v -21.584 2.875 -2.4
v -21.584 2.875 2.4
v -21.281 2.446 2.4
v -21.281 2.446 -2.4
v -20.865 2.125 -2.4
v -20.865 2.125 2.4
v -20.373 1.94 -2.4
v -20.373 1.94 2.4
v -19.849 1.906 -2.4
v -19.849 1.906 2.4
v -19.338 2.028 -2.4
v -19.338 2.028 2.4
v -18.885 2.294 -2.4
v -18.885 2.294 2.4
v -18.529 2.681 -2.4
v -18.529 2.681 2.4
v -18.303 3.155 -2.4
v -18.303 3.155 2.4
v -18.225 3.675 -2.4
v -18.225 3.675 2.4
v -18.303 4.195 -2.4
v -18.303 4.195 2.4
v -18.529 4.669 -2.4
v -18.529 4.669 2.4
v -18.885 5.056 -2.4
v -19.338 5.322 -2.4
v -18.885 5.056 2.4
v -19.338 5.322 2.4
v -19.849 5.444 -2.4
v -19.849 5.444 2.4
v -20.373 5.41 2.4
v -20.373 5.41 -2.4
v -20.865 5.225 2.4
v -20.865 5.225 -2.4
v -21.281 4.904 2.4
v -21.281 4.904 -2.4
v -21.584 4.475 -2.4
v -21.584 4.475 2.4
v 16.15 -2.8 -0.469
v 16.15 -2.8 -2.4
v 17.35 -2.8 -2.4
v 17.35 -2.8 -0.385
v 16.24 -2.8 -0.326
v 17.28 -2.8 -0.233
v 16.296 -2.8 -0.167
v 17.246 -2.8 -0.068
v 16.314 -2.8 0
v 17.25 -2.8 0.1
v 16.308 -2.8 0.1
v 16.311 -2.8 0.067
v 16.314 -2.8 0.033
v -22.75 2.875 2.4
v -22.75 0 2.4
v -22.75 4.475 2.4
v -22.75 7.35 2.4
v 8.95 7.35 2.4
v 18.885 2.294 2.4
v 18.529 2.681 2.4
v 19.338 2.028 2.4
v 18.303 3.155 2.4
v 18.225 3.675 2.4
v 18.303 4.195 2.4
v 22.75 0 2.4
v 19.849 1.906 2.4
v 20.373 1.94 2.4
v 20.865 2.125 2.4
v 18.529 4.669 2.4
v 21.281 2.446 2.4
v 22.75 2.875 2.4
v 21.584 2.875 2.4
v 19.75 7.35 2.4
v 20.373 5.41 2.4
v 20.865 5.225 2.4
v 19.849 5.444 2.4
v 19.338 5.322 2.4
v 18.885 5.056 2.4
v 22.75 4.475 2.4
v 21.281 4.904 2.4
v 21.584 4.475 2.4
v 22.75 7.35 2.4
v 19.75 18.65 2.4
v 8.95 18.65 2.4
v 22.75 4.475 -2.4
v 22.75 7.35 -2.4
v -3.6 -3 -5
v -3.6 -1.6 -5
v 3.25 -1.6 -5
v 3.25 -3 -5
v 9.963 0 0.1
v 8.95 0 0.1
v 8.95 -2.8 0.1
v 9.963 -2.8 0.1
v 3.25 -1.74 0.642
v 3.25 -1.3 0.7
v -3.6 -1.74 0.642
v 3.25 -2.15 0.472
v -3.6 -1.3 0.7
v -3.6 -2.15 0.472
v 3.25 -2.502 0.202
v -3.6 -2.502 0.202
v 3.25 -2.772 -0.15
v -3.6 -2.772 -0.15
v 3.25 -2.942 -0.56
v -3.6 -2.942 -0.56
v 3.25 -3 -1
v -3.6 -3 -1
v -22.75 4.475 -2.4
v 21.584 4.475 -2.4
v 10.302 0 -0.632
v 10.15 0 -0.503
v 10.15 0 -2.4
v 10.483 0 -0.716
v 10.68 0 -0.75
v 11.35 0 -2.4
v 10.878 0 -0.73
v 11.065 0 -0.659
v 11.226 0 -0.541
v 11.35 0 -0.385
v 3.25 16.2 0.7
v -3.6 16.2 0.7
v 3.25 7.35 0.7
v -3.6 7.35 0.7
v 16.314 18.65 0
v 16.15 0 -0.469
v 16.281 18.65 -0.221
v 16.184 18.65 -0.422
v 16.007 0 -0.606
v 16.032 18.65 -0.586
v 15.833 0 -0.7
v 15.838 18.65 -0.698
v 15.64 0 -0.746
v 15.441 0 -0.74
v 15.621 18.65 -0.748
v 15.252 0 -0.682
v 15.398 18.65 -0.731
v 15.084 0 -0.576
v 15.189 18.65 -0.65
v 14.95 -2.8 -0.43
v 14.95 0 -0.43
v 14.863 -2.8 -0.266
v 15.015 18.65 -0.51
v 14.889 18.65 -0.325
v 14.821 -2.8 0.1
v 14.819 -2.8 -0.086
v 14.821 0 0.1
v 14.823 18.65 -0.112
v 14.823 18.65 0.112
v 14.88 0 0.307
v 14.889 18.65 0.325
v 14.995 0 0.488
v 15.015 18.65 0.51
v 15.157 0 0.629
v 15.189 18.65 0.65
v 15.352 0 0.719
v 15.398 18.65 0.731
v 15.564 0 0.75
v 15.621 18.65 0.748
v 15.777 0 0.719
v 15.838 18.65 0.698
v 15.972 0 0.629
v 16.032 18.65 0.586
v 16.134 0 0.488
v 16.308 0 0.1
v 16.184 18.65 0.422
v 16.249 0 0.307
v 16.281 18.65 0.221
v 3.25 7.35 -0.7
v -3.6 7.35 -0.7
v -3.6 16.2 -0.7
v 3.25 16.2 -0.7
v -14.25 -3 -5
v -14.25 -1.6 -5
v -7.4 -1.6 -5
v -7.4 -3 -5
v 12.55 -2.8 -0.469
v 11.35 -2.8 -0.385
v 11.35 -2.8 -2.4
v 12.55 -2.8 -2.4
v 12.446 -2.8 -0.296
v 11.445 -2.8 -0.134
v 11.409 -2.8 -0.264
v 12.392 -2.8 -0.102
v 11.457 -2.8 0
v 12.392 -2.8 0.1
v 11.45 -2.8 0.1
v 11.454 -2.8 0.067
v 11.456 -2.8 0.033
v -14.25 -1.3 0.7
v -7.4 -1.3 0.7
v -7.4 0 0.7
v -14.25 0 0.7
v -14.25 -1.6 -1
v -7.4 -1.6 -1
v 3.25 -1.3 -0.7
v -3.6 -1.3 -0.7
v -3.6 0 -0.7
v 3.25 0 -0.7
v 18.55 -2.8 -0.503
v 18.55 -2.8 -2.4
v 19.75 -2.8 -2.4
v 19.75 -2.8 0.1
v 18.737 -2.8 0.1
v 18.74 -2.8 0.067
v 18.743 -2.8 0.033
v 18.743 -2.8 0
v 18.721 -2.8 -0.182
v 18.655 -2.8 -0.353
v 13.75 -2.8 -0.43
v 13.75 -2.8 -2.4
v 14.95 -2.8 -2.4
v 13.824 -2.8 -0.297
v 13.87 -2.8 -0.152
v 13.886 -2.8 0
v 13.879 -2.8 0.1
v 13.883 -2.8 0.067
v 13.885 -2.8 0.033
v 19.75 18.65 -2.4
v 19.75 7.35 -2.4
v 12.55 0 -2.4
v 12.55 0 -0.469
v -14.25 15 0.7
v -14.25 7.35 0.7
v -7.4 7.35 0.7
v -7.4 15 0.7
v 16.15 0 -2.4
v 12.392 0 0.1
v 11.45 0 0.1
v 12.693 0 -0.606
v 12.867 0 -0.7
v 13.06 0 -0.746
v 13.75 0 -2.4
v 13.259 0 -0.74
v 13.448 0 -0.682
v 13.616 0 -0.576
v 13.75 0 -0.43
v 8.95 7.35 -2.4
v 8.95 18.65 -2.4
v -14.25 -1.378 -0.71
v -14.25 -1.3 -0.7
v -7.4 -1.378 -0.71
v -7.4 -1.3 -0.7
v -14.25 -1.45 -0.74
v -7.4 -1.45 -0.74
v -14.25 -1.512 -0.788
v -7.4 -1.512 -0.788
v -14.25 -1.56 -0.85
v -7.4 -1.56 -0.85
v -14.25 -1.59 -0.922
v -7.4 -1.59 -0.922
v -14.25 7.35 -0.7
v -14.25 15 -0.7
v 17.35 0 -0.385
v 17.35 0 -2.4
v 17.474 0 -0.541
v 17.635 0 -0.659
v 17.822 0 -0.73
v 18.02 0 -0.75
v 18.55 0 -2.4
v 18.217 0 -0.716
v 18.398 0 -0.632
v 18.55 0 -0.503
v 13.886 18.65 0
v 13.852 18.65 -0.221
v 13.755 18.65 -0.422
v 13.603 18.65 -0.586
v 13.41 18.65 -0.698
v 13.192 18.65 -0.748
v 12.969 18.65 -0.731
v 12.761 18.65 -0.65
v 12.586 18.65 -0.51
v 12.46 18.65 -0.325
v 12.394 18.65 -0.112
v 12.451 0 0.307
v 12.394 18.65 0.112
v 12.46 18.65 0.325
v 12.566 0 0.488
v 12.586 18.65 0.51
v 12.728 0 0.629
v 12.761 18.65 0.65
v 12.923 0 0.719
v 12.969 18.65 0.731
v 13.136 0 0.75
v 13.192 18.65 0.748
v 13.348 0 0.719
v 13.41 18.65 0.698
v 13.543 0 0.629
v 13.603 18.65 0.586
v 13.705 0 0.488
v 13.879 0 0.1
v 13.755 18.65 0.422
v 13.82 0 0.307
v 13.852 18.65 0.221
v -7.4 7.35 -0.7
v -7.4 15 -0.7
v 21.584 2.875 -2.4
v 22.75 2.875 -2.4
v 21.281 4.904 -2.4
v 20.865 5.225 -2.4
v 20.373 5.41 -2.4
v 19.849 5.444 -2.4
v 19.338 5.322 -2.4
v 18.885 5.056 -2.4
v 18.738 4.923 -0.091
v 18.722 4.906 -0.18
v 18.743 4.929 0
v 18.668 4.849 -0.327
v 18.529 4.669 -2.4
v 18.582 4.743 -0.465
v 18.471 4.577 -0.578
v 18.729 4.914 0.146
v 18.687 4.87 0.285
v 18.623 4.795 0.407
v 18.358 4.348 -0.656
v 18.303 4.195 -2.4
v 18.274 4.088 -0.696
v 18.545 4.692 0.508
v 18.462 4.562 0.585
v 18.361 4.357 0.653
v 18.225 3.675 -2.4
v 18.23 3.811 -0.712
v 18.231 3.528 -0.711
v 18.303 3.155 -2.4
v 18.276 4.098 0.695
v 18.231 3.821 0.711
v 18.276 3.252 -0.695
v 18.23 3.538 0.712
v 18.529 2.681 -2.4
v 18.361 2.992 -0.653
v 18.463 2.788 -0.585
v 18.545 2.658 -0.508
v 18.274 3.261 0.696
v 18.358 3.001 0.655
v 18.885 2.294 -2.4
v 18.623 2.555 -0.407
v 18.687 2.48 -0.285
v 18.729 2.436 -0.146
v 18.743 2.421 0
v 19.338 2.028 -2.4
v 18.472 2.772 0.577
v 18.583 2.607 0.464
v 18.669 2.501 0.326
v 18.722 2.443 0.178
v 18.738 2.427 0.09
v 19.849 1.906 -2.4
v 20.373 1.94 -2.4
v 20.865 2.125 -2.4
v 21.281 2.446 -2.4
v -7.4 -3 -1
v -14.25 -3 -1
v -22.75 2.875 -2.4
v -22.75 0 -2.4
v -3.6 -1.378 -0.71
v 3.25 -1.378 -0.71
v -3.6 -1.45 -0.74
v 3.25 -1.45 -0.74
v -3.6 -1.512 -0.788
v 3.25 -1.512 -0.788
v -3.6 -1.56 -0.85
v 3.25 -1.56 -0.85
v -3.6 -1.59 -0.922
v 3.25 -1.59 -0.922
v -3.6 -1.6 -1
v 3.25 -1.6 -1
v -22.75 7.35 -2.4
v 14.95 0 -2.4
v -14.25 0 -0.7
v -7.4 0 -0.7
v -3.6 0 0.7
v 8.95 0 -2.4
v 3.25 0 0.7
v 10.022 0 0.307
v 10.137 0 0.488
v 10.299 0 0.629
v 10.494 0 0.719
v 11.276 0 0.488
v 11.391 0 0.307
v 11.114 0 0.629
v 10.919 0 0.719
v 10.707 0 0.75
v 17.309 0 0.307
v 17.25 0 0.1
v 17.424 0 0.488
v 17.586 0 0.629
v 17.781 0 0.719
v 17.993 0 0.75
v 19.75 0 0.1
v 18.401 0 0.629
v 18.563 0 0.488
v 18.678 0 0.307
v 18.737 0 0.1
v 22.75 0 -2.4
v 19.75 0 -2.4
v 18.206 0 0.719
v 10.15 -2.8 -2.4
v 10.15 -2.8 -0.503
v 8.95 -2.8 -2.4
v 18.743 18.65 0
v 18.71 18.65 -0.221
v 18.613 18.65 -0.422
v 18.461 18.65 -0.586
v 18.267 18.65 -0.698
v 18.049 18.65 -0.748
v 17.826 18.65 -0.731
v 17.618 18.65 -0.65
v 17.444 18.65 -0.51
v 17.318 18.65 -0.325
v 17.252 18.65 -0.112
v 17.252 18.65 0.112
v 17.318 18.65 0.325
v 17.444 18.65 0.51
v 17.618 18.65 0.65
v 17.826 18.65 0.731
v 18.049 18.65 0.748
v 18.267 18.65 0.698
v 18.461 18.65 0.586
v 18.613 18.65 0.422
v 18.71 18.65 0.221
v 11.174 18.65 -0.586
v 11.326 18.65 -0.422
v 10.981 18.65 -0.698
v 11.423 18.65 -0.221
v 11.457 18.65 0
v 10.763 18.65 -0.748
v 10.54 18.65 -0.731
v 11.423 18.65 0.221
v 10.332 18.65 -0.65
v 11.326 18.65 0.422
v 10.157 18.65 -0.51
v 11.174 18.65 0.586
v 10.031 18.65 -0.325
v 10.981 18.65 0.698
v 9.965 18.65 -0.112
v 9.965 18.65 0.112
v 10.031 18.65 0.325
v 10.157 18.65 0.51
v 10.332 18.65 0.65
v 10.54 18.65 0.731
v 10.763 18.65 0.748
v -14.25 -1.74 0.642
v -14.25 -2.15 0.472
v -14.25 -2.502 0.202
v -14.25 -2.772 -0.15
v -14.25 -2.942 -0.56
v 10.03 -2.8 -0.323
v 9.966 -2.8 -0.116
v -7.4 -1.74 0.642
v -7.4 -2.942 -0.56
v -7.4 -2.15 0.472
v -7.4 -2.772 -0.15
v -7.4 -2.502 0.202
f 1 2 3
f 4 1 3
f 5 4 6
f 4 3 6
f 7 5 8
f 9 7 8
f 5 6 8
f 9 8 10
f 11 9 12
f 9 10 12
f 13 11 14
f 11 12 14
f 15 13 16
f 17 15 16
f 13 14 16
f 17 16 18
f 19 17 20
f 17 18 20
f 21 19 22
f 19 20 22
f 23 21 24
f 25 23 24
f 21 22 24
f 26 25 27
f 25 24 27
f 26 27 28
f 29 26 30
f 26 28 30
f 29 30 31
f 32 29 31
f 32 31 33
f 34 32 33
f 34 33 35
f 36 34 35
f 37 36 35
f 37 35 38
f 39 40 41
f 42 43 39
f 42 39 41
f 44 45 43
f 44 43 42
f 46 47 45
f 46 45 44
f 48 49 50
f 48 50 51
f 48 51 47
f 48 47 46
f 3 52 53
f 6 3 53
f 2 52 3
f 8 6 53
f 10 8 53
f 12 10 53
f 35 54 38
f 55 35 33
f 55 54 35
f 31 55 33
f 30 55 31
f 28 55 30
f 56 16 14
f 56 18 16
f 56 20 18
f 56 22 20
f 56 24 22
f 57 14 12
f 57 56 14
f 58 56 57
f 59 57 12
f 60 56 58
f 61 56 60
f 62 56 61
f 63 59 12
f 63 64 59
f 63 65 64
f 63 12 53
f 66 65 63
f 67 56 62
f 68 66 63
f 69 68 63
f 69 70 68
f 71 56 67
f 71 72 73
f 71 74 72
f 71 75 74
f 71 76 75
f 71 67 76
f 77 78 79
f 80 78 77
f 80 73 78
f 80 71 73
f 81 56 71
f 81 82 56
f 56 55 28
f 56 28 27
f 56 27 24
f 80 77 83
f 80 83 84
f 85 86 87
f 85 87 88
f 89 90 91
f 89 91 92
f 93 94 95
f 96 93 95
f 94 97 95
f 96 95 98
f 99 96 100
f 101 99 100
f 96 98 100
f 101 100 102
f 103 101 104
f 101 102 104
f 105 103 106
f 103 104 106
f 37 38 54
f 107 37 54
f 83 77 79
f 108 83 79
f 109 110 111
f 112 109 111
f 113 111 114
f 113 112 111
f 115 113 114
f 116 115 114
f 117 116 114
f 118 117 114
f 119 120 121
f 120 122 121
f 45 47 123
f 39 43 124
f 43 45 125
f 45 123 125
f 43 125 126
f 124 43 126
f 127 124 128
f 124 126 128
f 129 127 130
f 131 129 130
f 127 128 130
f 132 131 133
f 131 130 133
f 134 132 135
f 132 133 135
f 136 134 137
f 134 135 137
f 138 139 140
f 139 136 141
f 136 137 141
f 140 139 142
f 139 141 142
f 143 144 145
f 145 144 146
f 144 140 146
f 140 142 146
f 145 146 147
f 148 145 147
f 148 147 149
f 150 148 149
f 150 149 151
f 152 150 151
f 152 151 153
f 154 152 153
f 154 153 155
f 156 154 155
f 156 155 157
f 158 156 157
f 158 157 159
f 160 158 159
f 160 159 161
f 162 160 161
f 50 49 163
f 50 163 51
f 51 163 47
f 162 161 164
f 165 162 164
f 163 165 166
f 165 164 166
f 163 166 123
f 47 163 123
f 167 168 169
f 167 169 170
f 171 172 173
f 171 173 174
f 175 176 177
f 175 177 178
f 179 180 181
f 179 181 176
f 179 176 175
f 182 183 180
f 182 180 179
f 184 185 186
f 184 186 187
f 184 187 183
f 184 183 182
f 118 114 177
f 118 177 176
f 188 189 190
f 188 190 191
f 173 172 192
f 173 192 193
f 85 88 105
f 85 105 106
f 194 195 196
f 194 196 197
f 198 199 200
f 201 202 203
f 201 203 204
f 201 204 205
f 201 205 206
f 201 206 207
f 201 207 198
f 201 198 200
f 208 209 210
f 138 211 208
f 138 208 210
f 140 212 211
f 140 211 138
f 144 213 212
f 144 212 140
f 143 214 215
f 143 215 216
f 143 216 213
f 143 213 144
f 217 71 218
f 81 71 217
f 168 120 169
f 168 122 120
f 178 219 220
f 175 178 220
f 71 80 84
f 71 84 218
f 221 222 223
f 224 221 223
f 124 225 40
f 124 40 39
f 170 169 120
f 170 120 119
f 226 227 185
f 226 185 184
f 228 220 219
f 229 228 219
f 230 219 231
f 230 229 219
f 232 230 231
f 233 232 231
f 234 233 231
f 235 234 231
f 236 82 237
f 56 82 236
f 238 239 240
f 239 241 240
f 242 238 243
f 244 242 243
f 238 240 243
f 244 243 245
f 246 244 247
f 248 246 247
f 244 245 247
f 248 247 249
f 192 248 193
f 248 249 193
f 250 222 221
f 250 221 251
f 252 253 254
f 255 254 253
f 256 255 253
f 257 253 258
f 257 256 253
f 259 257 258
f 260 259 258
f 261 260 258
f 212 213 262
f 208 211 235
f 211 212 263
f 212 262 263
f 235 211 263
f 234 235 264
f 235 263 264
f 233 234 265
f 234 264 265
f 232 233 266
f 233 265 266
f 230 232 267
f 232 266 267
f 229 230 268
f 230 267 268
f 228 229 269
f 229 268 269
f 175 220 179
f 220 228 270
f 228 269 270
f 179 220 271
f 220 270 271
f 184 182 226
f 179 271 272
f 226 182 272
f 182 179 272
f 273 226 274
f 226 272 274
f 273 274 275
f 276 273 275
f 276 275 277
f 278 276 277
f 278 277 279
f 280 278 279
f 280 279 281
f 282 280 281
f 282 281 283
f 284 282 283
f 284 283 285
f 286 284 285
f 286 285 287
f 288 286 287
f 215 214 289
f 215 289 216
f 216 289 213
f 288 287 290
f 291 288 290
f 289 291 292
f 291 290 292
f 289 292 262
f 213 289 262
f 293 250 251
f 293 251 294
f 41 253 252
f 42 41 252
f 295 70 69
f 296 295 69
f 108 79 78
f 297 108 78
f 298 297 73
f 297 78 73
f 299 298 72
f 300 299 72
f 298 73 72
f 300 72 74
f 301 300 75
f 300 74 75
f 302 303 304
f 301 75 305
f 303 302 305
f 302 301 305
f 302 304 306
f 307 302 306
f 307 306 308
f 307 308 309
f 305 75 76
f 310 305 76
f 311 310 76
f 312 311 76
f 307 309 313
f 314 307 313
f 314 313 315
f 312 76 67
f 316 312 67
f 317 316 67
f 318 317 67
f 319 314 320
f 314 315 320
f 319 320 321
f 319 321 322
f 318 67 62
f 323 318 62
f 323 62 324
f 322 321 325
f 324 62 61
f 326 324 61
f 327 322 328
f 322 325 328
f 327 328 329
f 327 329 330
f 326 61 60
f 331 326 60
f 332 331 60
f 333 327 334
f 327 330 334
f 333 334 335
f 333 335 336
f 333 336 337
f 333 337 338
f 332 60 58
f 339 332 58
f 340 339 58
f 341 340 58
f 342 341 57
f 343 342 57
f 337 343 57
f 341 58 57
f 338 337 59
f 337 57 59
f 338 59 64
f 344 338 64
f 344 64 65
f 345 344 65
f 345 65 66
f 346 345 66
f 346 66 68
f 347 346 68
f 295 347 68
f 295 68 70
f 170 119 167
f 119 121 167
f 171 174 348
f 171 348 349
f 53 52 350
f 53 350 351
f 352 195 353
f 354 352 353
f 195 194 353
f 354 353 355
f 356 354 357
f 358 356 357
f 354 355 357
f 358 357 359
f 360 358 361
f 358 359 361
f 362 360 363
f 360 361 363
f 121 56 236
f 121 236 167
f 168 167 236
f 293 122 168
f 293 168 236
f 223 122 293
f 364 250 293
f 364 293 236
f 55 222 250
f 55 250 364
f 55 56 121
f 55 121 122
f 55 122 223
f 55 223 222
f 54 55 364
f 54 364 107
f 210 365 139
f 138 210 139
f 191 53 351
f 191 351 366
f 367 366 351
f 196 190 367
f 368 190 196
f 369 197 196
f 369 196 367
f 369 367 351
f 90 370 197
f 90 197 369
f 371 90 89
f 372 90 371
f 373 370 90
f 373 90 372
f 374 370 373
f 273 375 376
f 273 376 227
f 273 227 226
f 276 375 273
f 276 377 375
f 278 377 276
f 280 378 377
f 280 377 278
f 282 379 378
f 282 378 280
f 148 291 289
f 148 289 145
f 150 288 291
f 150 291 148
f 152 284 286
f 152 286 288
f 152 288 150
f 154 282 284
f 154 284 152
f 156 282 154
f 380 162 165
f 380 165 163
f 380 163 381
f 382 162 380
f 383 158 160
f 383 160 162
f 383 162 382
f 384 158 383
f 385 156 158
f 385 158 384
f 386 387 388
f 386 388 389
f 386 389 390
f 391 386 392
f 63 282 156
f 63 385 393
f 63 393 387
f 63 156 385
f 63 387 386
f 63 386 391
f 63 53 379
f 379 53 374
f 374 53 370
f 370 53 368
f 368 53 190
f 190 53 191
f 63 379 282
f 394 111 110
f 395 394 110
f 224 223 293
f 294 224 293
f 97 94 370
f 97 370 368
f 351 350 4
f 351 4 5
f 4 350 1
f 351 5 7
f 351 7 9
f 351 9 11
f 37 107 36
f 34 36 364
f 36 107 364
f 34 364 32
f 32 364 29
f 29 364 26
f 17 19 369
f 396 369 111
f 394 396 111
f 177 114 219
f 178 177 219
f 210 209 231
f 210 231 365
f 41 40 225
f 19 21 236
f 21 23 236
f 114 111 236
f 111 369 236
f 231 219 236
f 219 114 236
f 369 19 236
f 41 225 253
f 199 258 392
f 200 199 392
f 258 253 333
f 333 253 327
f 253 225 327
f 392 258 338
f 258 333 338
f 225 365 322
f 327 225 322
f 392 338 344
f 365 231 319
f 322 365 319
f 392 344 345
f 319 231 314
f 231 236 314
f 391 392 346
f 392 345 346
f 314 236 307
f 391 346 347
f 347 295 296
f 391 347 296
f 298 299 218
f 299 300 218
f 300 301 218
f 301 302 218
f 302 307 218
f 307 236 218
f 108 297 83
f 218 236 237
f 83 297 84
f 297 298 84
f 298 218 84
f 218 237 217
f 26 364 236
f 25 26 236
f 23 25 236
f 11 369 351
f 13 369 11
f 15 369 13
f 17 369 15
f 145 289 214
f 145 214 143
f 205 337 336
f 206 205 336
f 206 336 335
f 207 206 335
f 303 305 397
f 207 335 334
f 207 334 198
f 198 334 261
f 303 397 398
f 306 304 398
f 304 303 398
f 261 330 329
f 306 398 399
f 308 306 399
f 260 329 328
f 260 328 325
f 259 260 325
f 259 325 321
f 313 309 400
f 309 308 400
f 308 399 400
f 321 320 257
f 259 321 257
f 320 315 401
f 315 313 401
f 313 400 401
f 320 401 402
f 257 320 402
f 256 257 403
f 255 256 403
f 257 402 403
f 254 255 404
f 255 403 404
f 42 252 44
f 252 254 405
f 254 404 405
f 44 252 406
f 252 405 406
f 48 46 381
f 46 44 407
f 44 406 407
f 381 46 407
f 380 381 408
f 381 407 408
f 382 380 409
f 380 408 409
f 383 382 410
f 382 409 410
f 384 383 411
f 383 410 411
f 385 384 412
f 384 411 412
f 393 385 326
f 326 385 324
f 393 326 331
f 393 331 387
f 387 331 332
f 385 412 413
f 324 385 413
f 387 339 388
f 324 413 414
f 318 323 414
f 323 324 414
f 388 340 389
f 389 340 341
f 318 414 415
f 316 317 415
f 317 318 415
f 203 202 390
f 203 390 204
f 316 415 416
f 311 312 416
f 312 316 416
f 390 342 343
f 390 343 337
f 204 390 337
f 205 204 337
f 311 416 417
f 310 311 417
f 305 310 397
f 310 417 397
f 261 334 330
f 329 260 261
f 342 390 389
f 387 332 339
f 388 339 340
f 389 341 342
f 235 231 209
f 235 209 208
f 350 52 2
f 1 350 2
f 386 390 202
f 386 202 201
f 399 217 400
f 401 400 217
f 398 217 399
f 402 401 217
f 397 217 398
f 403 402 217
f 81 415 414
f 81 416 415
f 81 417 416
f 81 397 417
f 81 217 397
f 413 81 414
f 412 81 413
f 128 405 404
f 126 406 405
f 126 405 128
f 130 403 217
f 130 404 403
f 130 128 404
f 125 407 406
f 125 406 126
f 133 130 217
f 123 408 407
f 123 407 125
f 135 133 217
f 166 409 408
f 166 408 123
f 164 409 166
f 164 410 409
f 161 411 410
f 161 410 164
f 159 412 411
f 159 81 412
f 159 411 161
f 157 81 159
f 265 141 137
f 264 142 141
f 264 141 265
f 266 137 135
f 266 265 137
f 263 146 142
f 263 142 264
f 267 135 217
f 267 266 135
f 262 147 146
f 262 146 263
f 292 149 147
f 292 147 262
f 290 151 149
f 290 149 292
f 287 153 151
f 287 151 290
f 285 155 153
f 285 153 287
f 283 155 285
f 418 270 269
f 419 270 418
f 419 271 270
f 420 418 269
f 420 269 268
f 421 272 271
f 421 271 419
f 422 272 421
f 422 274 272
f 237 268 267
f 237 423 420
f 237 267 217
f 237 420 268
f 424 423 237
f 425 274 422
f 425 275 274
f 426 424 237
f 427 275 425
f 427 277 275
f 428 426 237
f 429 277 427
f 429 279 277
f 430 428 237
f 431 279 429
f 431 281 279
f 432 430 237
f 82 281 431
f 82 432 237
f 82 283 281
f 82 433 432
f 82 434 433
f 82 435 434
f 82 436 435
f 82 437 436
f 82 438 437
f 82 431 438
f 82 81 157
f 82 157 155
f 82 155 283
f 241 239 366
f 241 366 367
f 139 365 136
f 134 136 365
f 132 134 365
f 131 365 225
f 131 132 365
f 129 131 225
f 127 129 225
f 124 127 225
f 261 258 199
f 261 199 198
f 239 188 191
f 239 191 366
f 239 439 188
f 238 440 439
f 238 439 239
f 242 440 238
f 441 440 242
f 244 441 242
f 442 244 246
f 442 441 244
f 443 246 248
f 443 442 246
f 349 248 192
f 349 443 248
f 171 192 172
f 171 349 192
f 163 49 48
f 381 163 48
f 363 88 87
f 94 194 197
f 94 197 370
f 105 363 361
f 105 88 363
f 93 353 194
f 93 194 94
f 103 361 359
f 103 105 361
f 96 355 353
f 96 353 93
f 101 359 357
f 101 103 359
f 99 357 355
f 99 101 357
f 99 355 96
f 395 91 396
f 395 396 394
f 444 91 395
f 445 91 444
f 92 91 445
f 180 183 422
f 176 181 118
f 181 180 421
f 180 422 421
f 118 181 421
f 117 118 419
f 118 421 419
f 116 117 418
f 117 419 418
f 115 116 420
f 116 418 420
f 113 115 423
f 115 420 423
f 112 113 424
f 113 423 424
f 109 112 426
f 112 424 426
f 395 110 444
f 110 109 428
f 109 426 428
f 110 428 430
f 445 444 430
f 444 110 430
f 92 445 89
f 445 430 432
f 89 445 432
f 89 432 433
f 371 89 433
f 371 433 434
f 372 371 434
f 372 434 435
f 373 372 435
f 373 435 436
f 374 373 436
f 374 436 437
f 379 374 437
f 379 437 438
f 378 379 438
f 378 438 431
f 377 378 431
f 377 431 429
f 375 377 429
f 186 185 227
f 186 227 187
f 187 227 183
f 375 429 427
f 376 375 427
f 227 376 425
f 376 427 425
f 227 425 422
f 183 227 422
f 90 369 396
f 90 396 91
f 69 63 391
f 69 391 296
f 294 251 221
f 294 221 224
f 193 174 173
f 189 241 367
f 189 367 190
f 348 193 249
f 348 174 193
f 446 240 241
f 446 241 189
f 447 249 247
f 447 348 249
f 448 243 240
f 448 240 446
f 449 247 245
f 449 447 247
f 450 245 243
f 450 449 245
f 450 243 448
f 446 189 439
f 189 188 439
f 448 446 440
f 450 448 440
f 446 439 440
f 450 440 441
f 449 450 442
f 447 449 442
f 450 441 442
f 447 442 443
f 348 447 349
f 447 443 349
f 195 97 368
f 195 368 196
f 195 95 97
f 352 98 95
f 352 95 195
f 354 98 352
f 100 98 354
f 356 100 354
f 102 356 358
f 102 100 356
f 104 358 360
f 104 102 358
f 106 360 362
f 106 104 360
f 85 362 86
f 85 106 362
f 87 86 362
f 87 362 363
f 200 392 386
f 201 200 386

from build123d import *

# Parameters (mm, degrees)
EXTRUDE_1_DEPTH     = 2.4
SKETCH_2_W          = 6.85
SKETCH_2_H          = 1.4
EXTRUDE_2_DEPTH     = 7.65
SKETCH_3_W          = 6.85
SKETCH_3_H          = 1.4
EXTRUDE_3_DEPTH     = 1.2
SKETCH_5_W          = 6.85
SKETCH_5_H          = 1.4
SKETCH_6_W          = 1.2
SKETCH_6_H          = 2.5
EXTRUDE_4_DEPTH     = 2.8
CUT_EXTRUDE_1_DEPTH = 8.4
SKETCH_8_R          = 0.75
CUT_EXTRUDE_2_DEPTH = 22.65


with BuildPart() as part:
    # 草图1 → 凸台-拉伸1 (new body, symmetric)
    with BuildSketch(Plane.XY):
        Polygon((-22.75, 7.35), (-22.75, 0), (22.75, 0), (22.75, 7.35), (19.75, 7.35), (19.75, 18.65), (8.95, 18.65), (8.95, 7.35), align=None)
    extrude(amount=EXTRUDE_1_DEPTH, both=True)

    # 草图2 → 凸台-拉伸2 (add)
    with BuildSketch(Plane(origin=(0, 7.35, 0), x_dir=(1, 0, 0), z_dir=(0, 1, 0))):
        with Locations((-10.825, 0)):
            Rectangle(SKETCH_2_W, SKETCH_2_H)
        with Locations((-0.175, 0)):
            Rectangle(SKETCH_2_W, SKETCH_2_H)
    extrude(amount=EXTRUDE_2_DEPTH)

    # 草图3 → 凸台-拉伸3 (add)
    with BuildSketch(Plane(origin=(0, 15, 0), x_dir=(1, 0, 0), z_dir=(0, 1, 0))):
        with Locations((-0.175, 0)):
            Rectangle(SKETCH_3_W, SKETCH_3_H)
    extrude(amount=EXTRUDE_3_DEPTH)

    # 扫描1: sweep along a path in 草图4
    with BuildLine(Plane(origin=(0, 0, 0), x_dir=(0, 0, -1), z_dir=(1, 0, 0))) as sweep_1_path:
        Line((0, 0), (0, -1.3))
        ThreePointArc((0, -1.3), (0.292893219, -2.007106781), (1, -2.3))
        Line((1, -2.3), (5, -2.3))
    # 草图5 → 扫描1 (sweep)
    with BuildSketch(Plane.XZ):
        with Locations((-0.175, 0)):
            Rectangle(SKETCH_5_W, SKETCH_5_H)
        with Locations((-10.825, 0)):
            Rectangle(SKETCH_5_W, SKETCH_5_H)
    sweep(path=sweep_1_path.line)

    # 草图6 → 凸台-拉伸4 (add)
    with BuildSketch(Plane.XZ):
        with Locations((16.75, -1.15)):
            Rectangle(SKETCH_6_W, SKETCH_6_H)
        with Locations((19.15, -1.15)):
            Rectangle(SKETCH_6_W, SKETCH_6_H)
        with Locations((14.35, -1.15)):
            Rectangle(SKETCH_6_W, SKETCH_6_H)
        with Locations((11.95, -1.15)):
            Rectangle(SKETCH_6_W, SKETCH_6_H)
        with Locations((9.55, -1.15)):
            Rectangle(SKETCH_6_W, SKETCH_6_H)
    extrude(amount=EXTRUDE_4_DEPTH)

    # 草图7 → 切除-拉伸1 (cut, through all)
    with BuildSketch(Plane.XY.offset(2.4)):
        with BuildLine():
            Line((-21.584495188, 4.475), (-22.75, 4.475))
            Line((-22.75, 4.475), (-22.75, 2.875))
            Line((-22.75, 2.875), (-21.584495188, 2.875))
            ThreePointArc((-21.584495188, 2.875), (-18.225, 3.675), (-21.584495188, 4.475))
        make_face()
        with BuildLine():
            Line((22.75, 2.875), (22.75, 4.475))
            Line((22.75, 4.475), (21.584495188, 4.475))
            ThreePointArc((21.584495188, 4.475), (18.225, 3.675), (21.584495188, 2.875))
            Line((21.584495188, 2.875), (22.75, 2.875))
        make_face()
    extrude(amount=-CUT_EXTRUDE_1_DEPTH, mode=Mode.SUBTRACT)

    # 草图8 → 切除-拉伸2 (cut, through all)
    with BuildSketch(Plane(origin=(0, 18.65, 0), x_dir=(1, 0, 0), z_dir=(0, 1, 0))):
        with Locations((10.706638524, 0)):
            Circle(SKETCH_8_R)
        with Locations((13.135546175, 0)):
            Circle(SKETCH_8_R)
        with Locations((15.564453825, 0)):
            Circle(SKETCH_8_R)
        with Locations((17.993361476, 0)):
            Circle(SKETCH_8_R)
    extrude(amount=-CUT_EXTRUDE_2_DEPTH, mode=Mode.SUBTRACT)


solid = part.part
